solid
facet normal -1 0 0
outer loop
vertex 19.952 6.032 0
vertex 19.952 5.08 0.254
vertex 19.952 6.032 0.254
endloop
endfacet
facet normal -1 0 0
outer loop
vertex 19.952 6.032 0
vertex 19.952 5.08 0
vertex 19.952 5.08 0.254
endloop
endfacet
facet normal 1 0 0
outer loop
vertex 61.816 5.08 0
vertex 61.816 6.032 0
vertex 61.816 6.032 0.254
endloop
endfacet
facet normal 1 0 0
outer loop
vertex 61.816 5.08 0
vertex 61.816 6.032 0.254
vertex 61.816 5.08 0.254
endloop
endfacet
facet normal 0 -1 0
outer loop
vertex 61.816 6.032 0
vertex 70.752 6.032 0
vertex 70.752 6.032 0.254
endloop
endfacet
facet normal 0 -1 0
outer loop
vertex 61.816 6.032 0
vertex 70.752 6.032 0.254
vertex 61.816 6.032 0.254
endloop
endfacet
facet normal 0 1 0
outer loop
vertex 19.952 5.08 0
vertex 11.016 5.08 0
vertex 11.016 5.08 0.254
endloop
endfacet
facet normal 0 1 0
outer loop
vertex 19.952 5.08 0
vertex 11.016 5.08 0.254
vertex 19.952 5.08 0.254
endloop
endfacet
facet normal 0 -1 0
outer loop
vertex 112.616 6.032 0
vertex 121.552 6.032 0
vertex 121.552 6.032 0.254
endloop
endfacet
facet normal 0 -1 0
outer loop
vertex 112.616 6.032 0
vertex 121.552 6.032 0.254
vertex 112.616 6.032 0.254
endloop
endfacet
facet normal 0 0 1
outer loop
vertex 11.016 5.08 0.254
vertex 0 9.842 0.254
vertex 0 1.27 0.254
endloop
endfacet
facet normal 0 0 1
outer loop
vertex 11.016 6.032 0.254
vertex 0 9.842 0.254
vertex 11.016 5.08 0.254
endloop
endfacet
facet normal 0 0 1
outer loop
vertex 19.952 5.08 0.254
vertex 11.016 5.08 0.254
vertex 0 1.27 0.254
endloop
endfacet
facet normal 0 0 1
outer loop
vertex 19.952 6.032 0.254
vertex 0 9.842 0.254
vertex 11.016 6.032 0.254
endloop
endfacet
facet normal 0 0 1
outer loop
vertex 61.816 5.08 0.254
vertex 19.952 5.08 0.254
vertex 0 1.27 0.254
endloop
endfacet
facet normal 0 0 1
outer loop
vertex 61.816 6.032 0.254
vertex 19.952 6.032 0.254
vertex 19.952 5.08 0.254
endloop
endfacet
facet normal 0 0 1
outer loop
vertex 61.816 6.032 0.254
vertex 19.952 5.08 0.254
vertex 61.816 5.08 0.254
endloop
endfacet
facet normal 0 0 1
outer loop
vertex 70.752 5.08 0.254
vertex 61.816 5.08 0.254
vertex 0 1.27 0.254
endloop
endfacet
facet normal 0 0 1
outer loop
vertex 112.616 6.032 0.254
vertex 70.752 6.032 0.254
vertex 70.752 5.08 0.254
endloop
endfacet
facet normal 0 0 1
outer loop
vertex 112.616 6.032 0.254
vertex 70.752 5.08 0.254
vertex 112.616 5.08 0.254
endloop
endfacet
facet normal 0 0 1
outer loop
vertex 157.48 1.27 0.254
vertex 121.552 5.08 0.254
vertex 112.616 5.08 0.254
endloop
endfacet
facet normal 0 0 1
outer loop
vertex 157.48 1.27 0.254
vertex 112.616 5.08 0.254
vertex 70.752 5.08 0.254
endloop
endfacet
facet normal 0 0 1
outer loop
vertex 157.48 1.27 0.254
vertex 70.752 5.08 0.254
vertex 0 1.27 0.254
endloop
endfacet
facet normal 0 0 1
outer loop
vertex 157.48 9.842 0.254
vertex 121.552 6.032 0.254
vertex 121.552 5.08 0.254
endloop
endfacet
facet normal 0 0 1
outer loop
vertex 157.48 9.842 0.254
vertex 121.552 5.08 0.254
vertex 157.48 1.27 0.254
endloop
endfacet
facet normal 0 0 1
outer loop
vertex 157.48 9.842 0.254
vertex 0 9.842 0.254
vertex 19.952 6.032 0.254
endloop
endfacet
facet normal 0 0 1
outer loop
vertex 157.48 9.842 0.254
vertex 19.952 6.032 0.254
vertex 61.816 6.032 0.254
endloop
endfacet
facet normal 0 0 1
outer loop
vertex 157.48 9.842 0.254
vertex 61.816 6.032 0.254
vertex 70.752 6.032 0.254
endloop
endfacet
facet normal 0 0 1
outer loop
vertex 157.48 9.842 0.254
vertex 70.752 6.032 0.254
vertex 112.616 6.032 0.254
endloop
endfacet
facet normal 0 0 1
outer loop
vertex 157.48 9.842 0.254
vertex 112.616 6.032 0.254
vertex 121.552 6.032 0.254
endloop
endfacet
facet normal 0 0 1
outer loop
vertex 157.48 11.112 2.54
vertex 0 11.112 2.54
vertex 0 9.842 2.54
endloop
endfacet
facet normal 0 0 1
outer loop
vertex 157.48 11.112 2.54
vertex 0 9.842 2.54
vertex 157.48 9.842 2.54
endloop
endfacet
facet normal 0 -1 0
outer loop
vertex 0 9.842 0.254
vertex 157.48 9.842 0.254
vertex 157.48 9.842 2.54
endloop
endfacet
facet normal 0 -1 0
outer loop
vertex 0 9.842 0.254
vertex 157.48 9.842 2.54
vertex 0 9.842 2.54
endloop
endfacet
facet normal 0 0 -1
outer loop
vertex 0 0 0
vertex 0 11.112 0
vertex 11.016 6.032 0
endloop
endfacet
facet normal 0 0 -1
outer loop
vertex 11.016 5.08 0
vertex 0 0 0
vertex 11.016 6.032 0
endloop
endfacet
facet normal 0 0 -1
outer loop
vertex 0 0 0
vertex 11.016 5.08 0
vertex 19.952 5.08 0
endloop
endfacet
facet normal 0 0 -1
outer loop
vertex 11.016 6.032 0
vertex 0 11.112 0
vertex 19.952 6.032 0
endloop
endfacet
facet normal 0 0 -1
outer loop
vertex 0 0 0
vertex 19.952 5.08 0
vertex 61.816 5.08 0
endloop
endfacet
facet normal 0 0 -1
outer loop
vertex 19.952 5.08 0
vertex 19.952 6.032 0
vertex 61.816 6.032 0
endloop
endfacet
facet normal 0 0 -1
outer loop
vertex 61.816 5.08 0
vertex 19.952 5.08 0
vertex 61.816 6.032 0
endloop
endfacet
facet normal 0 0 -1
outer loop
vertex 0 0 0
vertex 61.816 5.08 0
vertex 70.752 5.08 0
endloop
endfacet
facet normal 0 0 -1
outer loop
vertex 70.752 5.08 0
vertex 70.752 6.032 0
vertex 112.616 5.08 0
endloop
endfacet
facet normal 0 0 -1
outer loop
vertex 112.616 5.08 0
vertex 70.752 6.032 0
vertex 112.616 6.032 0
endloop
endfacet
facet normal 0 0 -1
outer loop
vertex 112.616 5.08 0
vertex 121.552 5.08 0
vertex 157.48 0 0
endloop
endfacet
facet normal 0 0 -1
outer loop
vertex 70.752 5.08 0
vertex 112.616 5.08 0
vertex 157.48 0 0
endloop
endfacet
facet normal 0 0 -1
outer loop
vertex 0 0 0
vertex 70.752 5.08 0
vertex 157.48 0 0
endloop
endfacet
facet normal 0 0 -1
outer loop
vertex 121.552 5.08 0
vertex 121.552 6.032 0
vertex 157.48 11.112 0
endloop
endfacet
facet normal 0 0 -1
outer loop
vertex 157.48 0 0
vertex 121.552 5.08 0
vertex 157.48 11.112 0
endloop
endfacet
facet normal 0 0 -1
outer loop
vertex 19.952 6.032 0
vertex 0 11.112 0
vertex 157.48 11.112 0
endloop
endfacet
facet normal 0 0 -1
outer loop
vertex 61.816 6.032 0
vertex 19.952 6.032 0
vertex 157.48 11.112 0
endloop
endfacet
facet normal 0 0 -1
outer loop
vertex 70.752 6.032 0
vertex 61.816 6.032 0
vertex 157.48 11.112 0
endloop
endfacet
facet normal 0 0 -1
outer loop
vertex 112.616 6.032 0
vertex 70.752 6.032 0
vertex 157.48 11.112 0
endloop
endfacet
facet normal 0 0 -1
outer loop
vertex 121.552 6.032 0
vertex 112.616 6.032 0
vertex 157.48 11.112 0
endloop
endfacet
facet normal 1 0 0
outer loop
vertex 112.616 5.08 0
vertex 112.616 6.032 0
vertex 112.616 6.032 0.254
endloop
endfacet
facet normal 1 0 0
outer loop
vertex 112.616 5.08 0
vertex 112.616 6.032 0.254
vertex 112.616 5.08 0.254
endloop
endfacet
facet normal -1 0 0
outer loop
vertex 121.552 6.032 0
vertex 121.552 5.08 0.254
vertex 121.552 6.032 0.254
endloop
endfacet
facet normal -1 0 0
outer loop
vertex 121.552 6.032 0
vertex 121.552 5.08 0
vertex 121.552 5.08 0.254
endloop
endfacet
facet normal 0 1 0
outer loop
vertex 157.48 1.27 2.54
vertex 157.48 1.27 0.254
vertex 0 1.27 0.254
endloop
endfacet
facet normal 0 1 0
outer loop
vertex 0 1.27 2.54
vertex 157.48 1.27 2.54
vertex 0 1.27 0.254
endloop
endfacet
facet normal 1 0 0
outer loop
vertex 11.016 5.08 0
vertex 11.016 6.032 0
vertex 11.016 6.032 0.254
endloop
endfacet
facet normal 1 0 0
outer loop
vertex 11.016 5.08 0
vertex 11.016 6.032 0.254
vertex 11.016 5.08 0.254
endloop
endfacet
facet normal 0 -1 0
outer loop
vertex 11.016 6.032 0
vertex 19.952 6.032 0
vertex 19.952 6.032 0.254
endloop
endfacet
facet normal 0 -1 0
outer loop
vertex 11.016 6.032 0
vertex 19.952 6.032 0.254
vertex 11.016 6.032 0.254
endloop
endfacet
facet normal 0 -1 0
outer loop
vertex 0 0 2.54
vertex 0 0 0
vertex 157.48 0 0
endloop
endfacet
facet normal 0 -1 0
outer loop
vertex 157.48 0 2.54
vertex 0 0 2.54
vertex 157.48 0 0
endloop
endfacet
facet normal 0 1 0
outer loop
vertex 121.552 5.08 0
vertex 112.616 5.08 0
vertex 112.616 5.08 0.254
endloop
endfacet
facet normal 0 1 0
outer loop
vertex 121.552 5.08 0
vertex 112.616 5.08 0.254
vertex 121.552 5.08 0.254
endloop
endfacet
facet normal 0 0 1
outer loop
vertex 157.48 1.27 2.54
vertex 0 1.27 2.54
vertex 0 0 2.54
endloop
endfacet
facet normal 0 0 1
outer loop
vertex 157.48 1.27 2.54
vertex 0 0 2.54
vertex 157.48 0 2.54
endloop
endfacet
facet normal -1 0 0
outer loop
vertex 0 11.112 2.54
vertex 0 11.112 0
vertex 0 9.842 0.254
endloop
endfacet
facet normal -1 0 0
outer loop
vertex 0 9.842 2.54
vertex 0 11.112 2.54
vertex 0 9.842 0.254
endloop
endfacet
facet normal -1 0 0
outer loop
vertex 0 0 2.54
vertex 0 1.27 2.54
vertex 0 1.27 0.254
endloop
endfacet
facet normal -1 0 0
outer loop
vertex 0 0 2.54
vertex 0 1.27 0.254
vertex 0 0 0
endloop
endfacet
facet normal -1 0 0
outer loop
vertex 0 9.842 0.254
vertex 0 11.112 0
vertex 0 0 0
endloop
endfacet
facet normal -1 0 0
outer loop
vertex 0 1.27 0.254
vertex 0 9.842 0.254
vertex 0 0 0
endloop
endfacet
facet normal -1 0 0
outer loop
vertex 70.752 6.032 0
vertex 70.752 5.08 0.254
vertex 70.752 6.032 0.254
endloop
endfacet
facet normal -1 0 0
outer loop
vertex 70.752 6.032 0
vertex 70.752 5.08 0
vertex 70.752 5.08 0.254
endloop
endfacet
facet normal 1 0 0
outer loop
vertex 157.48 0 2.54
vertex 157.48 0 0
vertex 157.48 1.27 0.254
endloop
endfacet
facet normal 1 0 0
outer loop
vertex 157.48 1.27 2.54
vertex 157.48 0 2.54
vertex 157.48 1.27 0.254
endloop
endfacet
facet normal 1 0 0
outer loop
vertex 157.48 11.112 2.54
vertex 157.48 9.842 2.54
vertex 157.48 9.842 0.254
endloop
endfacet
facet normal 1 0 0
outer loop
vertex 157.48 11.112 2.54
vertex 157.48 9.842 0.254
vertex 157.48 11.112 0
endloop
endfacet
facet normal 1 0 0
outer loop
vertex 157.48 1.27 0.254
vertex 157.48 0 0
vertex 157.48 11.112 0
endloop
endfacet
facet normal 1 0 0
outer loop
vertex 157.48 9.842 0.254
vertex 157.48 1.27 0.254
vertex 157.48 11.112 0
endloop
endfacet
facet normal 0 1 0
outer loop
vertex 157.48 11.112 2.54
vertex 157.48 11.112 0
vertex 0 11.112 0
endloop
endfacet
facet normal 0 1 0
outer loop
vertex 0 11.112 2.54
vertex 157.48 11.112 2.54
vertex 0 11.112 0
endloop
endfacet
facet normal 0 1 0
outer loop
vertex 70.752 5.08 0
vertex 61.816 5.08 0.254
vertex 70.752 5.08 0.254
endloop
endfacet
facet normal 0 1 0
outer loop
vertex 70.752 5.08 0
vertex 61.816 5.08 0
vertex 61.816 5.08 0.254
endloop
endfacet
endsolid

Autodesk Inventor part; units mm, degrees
ref_plane "YZ Plane" through (0, 0, 0) normal (1, 0, 0) x (0, 1, 0)
ref_plane "XZ Plane" through (0, 0, 0) normal (0, 1, 0) x (-1, 0, 0)
ref_plane "XY Plane" through (0, 0, 0) normal (0, 0, 1) x (1, 0, 0)
sketch "Sketch1" plane through (0, 0, 0) normal (0, 0, 1) x (1, 0, 0)
  line L0 (0, 0) -> (157.48, 0)
  line L1 (157.48, 0) -> (157.48, 11.1125)
  line L2 (157.48, 11.1125) -> (0, 11.1125)
  line L3 (0, 11.1125) -> (0, 0)
  line L4 (0, 11.1125) -> (157.48, 11.1125)
  line L5 (157.48, 11.1125) -> (157.48, 9.8425)
  line L6 (157.48, 9.8425) -> (0, 9.8425)
  line L7 (0, 9.8425) -> (0, 11.1125)
  line L8 (0, 0) -> (157.48, 0)
  line L9 (157.48, 0) -> (157.48, 1.27)
  line L10 (157.48, 1.27) -> (0, 1.27)
  line L11 (0, 1.27) -> (0, 0)
  line L12 (11.0159, 5.08) -> (19.9525, 5.08)
  line L13 (19.9525, 5.08) -> (19.9525, 6.0325)
  line L14 (19.9525, 6.0325) -> (11.0159, 6.0325)
  line L15 (11.0159, 6.0325) -> (11.0159, 5.08)
  line L16 (70.7525, 5.08) -> (70.7525, 6.0325)
  line L17 (70.7525, 6.0325) -> (61.8159, 6.0325)
  line L18 (61.8159, 5.08) -> (70.7525, 5.08)
  line L19 (61.8159, 6.0325) -> (61.8159, 5.08)
  line L20 (121.5525, 5.08) -> (121.5525, 6.0325)
  line L21 (121.5525, 6.0325) -> (112.6159, 6.0325)
  line L22 (112.6159, 5.08) -> (121.5525, 5.08)
  line L23 (112.6159, 6.0325) -> (112.6159, 5.08)
  point P0 (39.5656, 5.08)
  point P1 (47.7905, 6.0325)
  point P2 (98.5905, 6.0325)
  point P3 (90.3656, 5.08)
  point P4 (149.3905, 6.0325)
  point P5 (141.1656, 5.08)
  point P6 (0, 9.8425)
  point P7 (0, 1.27)
  dimension "d0" = 157.48
  dimension "d1" = 11.1125
  dimension "d2" = 1.27
  dimension "d3" = 1.27
  dimension "d4" = 3.81
  dimension "d5" = 3.81
  dimension "d6" = 8.9366
  dimension "d9" = 50.8
extrude "Extrusion1" add sketch "Sketch1" along normal blind 2.54 contours L3 L10 L1 L0 | L3 L2 L1 L6
extrude "Extrusion2" add sketch "Sketch1" along normal blind 0.254 contours L3 L6 L1 L10
properties part number "Bracket holder"
